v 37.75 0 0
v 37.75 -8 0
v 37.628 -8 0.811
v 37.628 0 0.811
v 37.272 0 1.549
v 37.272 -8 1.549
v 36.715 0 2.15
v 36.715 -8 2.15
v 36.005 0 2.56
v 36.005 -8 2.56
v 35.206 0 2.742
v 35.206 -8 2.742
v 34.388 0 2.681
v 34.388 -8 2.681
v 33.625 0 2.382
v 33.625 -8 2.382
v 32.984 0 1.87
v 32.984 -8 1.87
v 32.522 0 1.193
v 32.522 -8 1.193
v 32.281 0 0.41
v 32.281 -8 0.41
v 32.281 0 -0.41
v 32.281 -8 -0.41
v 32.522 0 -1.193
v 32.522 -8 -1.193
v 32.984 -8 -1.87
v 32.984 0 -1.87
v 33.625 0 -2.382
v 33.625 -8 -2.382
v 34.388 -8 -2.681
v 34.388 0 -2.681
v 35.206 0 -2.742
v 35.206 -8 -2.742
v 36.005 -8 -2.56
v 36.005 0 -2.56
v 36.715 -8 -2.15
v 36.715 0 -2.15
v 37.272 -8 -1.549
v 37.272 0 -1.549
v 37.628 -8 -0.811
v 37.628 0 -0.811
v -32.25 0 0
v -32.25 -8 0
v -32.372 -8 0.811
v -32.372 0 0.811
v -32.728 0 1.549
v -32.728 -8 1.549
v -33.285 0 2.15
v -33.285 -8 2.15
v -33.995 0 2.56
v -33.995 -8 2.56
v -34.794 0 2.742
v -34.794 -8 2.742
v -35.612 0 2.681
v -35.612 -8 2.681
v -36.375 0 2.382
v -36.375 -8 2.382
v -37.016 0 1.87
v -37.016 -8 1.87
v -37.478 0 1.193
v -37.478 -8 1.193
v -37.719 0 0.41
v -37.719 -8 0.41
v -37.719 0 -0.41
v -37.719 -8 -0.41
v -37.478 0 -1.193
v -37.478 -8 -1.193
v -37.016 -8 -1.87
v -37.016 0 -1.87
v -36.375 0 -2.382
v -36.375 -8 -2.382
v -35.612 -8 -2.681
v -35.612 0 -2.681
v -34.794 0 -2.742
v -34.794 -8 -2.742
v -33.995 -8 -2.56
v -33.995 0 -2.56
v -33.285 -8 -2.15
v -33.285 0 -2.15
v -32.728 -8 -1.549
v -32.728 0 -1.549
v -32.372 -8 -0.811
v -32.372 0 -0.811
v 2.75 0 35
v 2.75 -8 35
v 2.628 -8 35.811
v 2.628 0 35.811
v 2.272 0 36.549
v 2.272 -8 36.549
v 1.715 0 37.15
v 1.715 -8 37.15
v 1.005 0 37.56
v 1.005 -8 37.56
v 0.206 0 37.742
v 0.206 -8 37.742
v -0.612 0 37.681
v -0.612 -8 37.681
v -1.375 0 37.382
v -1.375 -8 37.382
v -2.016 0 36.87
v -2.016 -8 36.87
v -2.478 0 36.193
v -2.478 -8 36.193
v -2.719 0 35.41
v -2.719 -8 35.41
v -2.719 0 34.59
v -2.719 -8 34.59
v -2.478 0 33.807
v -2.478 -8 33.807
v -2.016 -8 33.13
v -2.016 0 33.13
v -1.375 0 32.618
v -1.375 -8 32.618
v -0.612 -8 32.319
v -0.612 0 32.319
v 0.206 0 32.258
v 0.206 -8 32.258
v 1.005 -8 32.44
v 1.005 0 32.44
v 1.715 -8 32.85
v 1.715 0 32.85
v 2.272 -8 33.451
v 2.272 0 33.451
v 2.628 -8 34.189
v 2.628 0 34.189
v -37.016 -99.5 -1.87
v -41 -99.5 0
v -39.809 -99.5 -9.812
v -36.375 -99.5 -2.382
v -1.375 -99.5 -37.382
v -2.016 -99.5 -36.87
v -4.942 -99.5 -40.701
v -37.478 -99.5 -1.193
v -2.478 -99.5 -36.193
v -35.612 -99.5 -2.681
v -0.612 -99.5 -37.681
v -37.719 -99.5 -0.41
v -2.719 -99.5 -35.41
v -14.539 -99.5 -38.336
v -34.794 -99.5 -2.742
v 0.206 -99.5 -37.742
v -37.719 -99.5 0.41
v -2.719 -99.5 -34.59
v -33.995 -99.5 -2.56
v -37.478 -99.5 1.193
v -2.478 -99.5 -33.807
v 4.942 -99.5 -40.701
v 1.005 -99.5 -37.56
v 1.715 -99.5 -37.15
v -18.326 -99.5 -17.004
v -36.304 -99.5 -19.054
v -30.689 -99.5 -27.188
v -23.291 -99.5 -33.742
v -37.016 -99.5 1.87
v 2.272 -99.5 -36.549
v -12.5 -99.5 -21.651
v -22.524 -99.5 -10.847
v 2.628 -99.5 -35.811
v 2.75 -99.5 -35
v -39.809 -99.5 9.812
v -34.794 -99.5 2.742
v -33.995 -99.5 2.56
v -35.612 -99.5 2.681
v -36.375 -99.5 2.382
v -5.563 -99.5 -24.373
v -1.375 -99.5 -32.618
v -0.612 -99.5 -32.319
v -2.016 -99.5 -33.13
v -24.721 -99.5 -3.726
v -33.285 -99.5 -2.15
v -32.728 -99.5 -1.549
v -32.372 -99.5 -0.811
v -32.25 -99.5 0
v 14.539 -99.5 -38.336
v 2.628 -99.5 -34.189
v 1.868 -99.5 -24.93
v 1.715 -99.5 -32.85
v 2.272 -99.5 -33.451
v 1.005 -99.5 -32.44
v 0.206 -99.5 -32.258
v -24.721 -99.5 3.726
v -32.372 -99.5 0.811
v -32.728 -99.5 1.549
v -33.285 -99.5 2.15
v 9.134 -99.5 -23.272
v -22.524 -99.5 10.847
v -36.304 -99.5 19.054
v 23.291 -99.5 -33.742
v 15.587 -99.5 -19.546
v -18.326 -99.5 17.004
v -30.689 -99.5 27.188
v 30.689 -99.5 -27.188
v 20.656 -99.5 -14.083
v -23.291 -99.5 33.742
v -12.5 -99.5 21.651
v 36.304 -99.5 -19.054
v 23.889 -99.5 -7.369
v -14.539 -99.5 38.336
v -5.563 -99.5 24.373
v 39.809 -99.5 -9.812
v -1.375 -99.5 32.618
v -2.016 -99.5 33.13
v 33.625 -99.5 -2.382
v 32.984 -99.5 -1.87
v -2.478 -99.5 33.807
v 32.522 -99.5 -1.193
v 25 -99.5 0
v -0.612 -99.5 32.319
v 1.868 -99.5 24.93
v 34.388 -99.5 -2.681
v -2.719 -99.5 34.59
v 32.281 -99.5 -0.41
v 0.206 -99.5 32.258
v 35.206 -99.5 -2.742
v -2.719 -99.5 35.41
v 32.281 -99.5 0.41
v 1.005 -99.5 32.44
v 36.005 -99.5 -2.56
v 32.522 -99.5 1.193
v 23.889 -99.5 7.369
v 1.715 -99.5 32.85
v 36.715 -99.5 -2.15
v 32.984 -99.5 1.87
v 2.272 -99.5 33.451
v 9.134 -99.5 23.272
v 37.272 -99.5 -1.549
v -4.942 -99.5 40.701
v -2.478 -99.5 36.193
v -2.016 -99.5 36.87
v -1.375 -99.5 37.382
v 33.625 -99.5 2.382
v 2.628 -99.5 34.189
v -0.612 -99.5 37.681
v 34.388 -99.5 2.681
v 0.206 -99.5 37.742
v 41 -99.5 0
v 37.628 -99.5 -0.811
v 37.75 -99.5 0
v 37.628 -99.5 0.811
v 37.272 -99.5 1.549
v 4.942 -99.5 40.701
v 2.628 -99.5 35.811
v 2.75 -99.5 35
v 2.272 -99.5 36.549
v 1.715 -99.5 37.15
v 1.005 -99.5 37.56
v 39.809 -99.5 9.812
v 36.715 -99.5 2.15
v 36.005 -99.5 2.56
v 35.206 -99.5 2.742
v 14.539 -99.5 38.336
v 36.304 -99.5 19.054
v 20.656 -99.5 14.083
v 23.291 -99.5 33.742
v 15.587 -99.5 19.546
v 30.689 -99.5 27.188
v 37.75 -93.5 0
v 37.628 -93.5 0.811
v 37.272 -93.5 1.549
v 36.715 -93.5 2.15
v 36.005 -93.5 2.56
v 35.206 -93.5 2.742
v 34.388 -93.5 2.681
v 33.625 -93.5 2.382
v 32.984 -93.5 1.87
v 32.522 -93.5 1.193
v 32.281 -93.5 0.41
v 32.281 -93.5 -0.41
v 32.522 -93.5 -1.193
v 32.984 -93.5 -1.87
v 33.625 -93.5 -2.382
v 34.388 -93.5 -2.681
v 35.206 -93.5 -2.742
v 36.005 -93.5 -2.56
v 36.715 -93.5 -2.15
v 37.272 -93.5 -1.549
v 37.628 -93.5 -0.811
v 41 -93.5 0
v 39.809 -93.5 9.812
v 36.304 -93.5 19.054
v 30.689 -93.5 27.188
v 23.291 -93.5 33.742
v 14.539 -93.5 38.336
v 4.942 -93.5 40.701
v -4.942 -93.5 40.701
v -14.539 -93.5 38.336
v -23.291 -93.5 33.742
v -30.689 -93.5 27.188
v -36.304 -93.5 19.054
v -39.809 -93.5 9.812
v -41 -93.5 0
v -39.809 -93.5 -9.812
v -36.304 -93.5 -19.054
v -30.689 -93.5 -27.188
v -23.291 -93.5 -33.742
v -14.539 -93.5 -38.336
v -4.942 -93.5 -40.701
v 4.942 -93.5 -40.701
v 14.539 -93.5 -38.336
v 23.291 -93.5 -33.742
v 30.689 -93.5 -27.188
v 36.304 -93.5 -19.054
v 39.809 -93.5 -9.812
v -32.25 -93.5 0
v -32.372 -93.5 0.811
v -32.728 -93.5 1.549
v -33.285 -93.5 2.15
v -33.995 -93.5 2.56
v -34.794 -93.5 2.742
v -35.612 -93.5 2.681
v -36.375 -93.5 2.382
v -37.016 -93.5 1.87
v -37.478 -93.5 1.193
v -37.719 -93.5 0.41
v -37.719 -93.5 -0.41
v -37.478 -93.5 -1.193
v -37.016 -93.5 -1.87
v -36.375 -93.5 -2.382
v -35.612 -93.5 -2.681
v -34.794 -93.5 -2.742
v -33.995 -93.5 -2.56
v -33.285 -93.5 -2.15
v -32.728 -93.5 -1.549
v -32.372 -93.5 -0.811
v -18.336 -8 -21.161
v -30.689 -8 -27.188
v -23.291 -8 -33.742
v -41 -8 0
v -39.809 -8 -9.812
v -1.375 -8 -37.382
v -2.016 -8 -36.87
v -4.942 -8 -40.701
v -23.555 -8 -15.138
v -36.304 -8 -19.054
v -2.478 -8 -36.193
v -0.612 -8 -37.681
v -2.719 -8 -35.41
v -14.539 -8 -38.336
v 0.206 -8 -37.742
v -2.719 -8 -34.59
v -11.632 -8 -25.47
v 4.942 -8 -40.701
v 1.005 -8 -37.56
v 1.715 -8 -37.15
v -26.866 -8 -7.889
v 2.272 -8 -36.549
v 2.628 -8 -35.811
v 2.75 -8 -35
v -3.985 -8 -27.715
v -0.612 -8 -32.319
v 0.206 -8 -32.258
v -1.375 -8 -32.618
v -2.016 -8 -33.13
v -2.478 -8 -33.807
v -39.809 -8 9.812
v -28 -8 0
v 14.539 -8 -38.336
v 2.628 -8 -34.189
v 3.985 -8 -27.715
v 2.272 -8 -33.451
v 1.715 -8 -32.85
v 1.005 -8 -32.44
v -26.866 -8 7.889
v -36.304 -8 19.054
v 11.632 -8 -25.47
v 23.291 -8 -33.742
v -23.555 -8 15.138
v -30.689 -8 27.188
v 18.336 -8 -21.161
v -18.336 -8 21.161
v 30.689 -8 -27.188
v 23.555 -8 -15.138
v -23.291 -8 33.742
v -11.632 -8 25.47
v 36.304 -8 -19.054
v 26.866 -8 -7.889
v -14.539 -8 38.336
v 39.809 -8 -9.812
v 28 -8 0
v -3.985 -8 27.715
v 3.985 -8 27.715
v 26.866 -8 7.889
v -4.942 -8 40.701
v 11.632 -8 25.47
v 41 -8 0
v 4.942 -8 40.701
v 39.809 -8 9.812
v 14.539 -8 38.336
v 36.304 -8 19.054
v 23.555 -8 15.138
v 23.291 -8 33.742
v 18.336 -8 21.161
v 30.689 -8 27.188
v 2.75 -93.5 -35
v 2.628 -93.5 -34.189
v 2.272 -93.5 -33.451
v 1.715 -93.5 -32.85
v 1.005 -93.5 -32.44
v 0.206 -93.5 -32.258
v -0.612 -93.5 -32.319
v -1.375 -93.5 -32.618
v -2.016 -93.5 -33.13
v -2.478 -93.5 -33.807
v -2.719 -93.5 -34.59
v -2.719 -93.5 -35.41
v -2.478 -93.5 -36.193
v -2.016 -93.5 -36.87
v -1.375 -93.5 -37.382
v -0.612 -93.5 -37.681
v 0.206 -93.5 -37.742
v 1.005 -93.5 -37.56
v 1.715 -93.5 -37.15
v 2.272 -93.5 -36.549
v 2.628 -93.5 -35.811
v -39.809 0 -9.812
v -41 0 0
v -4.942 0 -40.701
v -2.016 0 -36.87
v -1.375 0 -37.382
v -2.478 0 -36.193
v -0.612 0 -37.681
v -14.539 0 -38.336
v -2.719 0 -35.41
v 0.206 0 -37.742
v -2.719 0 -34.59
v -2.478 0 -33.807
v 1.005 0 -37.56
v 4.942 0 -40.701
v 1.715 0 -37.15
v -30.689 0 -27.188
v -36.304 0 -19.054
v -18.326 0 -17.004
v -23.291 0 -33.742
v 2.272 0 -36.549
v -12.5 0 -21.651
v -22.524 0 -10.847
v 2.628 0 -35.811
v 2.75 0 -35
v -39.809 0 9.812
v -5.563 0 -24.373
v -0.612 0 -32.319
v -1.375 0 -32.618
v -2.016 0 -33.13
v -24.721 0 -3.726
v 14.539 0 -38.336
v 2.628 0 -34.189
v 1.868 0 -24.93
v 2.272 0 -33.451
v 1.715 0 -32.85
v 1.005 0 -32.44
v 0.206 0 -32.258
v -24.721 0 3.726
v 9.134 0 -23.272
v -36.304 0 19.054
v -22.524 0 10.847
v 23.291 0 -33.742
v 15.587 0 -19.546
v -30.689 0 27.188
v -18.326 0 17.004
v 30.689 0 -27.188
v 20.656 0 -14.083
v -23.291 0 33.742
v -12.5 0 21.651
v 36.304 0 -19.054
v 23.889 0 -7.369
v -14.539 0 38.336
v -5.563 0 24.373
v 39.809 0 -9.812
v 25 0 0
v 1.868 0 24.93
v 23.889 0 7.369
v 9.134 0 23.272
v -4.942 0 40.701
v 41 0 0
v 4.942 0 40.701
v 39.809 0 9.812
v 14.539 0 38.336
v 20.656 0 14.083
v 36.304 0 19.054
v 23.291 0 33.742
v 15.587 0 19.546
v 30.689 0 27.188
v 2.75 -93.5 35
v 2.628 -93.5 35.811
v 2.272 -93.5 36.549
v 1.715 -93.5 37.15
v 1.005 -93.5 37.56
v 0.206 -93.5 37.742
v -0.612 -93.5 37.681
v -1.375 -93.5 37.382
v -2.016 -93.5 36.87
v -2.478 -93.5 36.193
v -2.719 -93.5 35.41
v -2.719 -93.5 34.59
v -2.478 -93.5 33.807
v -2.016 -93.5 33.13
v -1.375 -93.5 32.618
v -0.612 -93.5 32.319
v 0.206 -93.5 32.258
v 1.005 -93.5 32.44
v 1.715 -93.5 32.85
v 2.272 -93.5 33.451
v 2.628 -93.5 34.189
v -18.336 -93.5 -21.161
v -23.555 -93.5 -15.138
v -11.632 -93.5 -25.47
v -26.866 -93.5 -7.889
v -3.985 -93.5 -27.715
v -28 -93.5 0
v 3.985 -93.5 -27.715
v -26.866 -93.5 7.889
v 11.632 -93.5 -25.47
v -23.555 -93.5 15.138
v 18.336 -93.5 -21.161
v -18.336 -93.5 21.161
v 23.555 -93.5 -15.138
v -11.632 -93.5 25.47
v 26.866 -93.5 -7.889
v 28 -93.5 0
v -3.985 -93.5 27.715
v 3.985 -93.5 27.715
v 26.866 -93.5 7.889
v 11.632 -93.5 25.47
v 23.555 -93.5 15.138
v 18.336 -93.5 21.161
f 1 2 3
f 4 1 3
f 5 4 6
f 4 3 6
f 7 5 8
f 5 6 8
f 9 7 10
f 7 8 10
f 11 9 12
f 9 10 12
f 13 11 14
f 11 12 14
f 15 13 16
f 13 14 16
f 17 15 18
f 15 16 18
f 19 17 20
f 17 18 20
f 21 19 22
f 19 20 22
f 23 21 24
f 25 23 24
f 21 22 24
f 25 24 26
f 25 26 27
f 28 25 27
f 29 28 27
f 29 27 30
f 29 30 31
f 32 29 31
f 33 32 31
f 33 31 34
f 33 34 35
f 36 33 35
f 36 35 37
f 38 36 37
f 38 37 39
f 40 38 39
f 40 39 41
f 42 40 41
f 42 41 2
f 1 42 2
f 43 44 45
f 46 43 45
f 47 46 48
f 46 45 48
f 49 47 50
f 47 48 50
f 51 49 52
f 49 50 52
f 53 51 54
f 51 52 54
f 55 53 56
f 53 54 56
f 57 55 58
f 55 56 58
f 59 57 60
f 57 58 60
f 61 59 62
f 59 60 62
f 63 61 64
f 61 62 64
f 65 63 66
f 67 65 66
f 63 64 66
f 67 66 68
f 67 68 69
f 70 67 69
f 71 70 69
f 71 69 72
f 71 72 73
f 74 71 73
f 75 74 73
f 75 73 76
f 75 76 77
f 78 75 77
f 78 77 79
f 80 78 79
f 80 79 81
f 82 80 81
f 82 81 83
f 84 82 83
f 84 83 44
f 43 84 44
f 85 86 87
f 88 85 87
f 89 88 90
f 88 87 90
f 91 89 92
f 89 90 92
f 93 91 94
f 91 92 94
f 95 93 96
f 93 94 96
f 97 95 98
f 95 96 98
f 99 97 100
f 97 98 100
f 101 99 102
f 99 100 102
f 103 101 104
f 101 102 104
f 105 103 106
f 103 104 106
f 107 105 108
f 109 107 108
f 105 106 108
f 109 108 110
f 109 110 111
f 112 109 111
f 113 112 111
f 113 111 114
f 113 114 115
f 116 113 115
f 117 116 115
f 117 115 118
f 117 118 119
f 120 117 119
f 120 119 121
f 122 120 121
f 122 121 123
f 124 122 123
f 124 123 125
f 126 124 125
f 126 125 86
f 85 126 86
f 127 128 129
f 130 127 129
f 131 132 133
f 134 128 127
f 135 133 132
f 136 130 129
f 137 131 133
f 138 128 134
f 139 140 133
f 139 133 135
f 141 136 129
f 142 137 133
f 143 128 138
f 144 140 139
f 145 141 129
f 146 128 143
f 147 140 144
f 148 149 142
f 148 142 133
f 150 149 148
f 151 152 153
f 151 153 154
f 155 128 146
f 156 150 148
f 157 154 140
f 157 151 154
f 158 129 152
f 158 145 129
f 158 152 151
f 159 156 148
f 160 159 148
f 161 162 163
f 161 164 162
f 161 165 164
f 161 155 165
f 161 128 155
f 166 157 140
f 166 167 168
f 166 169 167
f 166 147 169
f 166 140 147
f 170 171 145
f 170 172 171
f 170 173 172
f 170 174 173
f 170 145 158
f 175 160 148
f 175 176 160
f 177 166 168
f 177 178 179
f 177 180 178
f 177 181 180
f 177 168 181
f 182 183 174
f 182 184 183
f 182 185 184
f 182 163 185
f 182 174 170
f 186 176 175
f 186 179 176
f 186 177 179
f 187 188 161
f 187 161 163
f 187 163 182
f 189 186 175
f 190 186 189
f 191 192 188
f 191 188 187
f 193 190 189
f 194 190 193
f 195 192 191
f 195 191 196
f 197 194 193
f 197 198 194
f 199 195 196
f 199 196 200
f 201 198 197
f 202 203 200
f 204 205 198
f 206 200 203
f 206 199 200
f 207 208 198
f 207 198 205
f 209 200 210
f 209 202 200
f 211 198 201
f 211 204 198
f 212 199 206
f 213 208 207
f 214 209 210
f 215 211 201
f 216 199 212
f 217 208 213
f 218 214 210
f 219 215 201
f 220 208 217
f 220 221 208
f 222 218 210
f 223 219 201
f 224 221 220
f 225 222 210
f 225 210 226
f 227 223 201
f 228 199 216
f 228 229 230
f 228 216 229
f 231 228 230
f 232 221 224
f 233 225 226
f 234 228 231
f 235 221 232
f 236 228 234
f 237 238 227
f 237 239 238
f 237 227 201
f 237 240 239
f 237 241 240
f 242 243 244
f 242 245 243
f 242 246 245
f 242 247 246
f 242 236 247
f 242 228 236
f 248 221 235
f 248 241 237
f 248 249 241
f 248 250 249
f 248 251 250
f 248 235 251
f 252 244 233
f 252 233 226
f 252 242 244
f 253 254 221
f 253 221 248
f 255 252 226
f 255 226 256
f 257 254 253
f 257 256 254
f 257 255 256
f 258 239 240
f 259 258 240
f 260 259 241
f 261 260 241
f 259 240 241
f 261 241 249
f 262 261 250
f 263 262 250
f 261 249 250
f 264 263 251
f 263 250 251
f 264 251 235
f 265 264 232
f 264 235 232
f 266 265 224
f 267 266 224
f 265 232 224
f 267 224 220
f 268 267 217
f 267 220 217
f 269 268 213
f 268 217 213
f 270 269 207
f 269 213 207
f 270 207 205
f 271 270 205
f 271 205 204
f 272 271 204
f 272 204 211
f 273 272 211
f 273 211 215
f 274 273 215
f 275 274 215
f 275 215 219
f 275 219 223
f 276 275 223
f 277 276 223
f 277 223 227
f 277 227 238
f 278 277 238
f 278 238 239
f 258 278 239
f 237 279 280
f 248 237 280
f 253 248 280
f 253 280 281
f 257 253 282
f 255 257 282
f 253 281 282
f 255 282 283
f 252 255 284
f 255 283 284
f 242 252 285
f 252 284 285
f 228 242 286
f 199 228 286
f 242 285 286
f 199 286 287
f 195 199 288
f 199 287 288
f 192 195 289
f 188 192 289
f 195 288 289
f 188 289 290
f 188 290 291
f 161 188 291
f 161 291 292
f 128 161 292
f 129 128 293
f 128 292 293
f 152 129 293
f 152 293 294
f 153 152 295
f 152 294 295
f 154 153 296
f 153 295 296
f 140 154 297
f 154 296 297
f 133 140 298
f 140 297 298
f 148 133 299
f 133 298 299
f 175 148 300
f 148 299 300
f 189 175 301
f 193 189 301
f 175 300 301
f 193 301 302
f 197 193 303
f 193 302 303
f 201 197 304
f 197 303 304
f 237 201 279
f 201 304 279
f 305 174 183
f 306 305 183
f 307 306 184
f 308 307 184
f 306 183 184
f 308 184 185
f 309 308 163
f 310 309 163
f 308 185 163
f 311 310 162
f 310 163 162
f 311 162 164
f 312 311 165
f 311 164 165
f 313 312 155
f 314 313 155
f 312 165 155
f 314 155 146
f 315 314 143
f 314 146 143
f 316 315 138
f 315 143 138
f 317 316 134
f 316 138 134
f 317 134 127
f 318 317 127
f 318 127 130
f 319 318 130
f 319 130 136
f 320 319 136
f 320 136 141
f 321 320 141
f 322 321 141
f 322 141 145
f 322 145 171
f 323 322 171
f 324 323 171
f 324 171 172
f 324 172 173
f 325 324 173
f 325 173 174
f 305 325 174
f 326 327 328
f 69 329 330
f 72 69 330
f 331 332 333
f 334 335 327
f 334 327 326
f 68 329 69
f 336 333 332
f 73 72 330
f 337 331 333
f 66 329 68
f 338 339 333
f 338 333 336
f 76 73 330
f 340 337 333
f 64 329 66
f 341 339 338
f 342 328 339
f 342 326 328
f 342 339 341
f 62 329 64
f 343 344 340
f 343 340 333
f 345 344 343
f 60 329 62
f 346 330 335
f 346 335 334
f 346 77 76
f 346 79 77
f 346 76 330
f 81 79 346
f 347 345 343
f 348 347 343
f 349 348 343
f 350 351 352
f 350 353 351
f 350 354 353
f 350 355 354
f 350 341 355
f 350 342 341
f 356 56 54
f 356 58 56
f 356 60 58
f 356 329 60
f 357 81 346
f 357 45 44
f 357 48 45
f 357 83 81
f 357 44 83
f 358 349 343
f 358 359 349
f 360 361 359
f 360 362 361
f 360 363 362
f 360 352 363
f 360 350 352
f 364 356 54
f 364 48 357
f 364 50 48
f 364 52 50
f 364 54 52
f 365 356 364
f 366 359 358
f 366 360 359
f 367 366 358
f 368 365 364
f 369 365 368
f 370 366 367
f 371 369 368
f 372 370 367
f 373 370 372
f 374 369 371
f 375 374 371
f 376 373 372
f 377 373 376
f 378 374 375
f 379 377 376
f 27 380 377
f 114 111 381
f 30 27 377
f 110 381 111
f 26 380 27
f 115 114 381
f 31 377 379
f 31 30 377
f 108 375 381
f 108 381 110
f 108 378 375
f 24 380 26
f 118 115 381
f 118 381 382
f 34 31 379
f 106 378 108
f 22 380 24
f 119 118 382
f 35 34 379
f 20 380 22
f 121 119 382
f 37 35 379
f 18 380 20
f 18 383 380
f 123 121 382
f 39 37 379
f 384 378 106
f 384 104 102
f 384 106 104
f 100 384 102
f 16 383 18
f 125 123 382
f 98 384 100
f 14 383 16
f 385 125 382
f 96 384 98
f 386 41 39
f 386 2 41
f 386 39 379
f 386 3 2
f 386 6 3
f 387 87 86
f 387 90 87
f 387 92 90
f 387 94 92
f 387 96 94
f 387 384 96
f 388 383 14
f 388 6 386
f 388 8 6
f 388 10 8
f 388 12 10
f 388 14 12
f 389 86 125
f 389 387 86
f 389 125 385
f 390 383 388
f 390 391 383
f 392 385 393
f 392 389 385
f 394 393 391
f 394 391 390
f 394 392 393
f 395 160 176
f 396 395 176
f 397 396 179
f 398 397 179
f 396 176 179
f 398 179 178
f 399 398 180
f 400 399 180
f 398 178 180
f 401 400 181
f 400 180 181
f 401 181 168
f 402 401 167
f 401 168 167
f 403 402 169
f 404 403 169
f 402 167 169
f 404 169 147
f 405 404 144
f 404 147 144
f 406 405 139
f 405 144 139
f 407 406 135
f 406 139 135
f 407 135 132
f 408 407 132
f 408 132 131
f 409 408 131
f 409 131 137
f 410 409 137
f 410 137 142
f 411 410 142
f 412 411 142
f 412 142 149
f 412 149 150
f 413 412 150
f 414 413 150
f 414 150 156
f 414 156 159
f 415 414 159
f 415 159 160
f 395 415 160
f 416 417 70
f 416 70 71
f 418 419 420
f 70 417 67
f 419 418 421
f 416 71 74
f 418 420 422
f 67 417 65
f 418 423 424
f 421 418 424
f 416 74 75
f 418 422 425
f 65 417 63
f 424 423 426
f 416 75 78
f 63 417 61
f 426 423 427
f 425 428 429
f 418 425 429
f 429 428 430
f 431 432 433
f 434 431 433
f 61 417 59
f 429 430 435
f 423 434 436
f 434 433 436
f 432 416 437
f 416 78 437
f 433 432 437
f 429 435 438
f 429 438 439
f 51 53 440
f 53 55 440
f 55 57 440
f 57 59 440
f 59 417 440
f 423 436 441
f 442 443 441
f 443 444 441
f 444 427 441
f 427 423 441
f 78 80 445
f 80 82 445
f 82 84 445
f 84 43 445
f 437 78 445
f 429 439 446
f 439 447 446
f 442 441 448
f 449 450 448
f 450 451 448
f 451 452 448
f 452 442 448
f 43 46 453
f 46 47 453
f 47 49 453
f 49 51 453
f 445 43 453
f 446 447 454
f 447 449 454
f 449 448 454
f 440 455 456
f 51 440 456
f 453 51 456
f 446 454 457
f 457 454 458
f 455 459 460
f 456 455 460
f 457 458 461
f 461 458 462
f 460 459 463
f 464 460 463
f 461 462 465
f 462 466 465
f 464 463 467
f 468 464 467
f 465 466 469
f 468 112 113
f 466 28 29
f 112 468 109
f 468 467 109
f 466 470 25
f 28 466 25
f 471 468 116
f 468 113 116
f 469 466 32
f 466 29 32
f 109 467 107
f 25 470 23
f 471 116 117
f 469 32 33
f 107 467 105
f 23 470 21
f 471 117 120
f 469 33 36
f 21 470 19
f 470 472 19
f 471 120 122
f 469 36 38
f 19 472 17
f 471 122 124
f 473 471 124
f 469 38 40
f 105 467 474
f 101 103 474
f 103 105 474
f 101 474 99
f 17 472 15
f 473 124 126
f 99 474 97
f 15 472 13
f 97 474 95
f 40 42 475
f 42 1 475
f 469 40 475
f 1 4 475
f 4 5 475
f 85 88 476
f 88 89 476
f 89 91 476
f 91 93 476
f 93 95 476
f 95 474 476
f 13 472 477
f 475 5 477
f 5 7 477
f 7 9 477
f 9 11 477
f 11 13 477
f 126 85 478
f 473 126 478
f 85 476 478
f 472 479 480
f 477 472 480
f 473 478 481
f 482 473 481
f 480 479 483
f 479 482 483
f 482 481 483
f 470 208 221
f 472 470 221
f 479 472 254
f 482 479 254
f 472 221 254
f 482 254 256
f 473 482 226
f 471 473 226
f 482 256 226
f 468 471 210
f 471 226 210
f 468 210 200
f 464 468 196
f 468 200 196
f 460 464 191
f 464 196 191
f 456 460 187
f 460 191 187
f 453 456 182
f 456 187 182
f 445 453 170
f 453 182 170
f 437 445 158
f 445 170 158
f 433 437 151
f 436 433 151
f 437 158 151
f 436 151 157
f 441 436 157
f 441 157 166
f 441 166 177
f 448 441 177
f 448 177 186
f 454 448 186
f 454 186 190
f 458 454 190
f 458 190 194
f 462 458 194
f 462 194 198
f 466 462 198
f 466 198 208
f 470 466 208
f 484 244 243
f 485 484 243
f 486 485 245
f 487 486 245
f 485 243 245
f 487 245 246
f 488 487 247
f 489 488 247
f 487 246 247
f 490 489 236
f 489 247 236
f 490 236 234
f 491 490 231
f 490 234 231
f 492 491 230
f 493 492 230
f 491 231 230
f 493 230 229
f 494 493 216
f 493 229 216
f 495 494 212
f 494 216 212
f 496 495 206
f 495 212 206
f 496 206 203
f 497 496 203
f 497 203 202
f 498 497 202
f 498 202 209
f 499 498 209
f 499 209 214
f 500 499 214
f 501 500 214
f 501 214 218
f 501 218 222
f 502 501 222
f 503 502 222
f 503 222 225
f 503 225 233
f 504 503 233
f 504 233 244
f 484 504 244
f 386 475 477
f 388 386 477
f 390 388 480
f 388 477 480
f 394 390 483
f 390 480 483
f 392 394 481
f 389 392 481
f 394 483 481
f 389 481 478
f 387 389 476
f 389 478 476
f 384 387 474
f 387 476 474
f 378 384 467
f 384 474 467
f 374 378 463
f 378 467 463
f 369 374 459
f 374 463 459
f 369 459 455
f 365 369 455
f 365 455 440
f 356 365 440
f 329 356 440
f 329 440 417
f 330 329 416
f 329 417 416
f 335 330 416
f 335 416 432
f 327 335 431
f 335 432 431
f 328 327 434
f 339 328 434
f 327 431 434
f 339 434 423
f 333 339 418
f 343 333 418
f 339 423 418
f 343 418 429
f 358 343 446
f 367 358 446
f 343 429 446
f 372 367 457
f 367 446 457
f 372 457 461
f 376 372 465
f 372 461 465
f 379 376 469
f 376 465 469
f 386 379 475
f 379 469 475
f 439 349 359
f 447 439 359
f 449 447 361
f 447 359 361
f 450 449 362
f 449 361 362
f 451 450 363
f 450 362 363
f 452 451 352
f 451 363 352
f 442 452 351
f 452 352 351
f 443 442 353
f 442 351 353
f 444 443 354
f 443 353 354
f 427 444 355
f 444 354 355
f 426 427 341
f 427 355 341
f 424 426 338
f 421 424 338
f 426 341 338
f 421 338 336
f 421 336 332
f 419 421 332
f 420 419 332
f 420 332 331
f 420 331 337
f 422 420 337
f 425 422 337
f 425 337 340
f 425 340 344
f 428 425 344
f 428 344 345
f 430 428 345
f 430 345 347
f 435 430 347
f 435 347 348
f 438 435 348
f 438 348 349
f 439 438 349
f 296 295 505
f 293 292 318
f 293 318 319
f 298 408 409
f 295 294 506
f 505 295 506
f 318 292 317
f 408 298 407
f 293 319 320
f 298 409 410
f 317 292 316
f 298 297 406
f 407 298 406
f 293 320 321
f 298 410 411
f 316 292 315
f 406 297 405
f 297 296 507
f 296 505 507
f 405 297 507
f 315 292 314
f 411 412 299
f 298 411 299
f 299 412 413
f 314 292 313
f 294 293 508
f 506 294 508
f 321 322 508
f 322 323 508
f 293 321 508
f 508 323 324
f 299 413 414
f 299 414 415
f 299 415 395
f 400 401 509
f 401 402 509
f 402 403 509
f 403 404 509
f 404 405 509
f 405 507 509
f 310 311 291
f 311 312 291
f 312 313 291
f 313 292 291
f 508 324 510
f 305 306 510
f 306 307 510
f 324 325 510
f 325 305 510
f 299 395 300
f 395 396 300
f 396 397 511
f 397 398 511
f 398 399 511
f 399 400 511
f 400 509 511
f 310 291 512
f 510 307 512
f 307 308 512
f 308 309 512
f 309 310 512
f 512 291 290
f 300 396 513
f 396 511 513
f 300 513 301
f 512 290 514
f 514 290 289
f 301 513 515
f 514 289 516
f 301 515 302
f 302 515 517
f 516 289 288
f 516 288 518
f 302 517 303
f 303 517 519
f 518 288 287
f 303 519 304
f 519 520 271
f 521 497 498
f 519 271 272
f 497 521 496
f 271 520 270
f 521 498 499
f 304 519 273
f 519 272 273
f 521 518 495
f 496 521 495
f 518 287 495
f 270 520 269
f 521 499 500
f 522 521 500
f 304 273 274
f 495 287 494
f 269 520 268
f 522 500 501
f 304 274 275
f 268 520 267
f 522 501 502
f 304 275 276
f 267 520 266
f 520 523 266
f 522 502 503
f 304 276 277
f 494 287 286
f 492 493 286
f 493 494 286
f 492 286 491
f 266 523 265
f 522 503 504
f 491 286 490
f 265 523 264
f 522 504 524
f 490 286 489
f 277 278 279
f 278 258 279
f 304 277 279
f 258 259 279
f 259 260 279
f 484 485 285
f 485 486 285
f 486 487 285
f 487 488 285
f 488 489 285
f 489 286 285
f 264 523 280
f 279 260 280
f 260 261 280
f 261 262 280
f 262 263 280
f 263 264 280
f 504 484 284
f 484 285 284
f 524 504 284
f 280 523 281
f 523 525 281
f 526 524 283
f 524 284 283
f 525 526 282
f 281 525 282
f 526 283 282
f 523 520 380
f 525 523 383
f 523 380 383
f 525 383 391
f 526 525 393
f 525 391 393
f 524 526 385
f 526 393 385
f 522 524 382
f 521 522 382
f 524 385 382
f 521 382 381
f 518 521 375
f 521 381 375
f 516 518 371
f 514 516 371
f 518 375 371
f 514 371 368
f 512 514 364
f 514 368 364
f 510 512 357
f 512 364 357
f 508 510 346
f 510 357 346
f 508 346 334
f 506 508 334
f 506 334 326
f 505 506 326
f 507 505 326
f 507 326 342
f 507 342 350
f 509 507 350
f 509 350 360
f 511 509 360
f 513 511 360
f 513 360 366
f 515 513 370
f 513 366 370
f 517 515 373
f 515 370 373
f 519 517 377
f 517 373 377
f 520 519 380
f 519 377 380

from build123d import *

# Parameters (mm, degrees)
F0_R     = 41
F1_DEPTH = 8
F2_R     = 28
F3_DEPTH = 85.5
F4_R     = 41
F4_R_2   = 28
F5_DEPTH = 6
F6_R     = 25
F7_DEPTH = 99.501
F8_R     = 2.75
F9_DEPTH = 99.501


with BuildPart() as f1:
    # F0 (on Front) → F1 (new body)
    with BuildSketch(Plane.XZ):
        Circle(F0_R)
    extrude(amount=F1_DEPTH)

    # F2 (on face) → F3 (join)
    with BuildSketch(Plane.XZ.offset(8)):
        Circle(F2_R)
    extrude(amount=F3_DEPTH)

    # F4 (on face) → F5 (join)
    with BuildSketch(Plane.XZ.offset(93.5)):
        Circle(F4_R)
        Circle(F4_R_2, mode=Mode.SUBTRACT)
        Circle(F4_R_2)
    extrude(amount=F5_DEPTH)

    # F6 (on face) → F7 (cut, through all)
    with BuildSketch(Plane.XZ.offset(99.5)):
        Circle(F6_R)
    extrude(amount=-F7_DEPTH, mode=Mode.SUBTRACT)

    # F8 (on face) → F9 (cut, through all)
    with BuildSketch(Plane.XZ.offset(99.5)):
        with Locations((-35, 0)):
            Circle(F8_R)
        with Locations((0, 35)):
            Circle(F8_R)
        with Locations((35, 0)):
            Circle(F8_R)
        with Locations((0, -35)):
            Circle(F8_R)
    extrude(amount=-F9_DEPTH, mode=Mode.SUBTRACT)


solid = f1.part
